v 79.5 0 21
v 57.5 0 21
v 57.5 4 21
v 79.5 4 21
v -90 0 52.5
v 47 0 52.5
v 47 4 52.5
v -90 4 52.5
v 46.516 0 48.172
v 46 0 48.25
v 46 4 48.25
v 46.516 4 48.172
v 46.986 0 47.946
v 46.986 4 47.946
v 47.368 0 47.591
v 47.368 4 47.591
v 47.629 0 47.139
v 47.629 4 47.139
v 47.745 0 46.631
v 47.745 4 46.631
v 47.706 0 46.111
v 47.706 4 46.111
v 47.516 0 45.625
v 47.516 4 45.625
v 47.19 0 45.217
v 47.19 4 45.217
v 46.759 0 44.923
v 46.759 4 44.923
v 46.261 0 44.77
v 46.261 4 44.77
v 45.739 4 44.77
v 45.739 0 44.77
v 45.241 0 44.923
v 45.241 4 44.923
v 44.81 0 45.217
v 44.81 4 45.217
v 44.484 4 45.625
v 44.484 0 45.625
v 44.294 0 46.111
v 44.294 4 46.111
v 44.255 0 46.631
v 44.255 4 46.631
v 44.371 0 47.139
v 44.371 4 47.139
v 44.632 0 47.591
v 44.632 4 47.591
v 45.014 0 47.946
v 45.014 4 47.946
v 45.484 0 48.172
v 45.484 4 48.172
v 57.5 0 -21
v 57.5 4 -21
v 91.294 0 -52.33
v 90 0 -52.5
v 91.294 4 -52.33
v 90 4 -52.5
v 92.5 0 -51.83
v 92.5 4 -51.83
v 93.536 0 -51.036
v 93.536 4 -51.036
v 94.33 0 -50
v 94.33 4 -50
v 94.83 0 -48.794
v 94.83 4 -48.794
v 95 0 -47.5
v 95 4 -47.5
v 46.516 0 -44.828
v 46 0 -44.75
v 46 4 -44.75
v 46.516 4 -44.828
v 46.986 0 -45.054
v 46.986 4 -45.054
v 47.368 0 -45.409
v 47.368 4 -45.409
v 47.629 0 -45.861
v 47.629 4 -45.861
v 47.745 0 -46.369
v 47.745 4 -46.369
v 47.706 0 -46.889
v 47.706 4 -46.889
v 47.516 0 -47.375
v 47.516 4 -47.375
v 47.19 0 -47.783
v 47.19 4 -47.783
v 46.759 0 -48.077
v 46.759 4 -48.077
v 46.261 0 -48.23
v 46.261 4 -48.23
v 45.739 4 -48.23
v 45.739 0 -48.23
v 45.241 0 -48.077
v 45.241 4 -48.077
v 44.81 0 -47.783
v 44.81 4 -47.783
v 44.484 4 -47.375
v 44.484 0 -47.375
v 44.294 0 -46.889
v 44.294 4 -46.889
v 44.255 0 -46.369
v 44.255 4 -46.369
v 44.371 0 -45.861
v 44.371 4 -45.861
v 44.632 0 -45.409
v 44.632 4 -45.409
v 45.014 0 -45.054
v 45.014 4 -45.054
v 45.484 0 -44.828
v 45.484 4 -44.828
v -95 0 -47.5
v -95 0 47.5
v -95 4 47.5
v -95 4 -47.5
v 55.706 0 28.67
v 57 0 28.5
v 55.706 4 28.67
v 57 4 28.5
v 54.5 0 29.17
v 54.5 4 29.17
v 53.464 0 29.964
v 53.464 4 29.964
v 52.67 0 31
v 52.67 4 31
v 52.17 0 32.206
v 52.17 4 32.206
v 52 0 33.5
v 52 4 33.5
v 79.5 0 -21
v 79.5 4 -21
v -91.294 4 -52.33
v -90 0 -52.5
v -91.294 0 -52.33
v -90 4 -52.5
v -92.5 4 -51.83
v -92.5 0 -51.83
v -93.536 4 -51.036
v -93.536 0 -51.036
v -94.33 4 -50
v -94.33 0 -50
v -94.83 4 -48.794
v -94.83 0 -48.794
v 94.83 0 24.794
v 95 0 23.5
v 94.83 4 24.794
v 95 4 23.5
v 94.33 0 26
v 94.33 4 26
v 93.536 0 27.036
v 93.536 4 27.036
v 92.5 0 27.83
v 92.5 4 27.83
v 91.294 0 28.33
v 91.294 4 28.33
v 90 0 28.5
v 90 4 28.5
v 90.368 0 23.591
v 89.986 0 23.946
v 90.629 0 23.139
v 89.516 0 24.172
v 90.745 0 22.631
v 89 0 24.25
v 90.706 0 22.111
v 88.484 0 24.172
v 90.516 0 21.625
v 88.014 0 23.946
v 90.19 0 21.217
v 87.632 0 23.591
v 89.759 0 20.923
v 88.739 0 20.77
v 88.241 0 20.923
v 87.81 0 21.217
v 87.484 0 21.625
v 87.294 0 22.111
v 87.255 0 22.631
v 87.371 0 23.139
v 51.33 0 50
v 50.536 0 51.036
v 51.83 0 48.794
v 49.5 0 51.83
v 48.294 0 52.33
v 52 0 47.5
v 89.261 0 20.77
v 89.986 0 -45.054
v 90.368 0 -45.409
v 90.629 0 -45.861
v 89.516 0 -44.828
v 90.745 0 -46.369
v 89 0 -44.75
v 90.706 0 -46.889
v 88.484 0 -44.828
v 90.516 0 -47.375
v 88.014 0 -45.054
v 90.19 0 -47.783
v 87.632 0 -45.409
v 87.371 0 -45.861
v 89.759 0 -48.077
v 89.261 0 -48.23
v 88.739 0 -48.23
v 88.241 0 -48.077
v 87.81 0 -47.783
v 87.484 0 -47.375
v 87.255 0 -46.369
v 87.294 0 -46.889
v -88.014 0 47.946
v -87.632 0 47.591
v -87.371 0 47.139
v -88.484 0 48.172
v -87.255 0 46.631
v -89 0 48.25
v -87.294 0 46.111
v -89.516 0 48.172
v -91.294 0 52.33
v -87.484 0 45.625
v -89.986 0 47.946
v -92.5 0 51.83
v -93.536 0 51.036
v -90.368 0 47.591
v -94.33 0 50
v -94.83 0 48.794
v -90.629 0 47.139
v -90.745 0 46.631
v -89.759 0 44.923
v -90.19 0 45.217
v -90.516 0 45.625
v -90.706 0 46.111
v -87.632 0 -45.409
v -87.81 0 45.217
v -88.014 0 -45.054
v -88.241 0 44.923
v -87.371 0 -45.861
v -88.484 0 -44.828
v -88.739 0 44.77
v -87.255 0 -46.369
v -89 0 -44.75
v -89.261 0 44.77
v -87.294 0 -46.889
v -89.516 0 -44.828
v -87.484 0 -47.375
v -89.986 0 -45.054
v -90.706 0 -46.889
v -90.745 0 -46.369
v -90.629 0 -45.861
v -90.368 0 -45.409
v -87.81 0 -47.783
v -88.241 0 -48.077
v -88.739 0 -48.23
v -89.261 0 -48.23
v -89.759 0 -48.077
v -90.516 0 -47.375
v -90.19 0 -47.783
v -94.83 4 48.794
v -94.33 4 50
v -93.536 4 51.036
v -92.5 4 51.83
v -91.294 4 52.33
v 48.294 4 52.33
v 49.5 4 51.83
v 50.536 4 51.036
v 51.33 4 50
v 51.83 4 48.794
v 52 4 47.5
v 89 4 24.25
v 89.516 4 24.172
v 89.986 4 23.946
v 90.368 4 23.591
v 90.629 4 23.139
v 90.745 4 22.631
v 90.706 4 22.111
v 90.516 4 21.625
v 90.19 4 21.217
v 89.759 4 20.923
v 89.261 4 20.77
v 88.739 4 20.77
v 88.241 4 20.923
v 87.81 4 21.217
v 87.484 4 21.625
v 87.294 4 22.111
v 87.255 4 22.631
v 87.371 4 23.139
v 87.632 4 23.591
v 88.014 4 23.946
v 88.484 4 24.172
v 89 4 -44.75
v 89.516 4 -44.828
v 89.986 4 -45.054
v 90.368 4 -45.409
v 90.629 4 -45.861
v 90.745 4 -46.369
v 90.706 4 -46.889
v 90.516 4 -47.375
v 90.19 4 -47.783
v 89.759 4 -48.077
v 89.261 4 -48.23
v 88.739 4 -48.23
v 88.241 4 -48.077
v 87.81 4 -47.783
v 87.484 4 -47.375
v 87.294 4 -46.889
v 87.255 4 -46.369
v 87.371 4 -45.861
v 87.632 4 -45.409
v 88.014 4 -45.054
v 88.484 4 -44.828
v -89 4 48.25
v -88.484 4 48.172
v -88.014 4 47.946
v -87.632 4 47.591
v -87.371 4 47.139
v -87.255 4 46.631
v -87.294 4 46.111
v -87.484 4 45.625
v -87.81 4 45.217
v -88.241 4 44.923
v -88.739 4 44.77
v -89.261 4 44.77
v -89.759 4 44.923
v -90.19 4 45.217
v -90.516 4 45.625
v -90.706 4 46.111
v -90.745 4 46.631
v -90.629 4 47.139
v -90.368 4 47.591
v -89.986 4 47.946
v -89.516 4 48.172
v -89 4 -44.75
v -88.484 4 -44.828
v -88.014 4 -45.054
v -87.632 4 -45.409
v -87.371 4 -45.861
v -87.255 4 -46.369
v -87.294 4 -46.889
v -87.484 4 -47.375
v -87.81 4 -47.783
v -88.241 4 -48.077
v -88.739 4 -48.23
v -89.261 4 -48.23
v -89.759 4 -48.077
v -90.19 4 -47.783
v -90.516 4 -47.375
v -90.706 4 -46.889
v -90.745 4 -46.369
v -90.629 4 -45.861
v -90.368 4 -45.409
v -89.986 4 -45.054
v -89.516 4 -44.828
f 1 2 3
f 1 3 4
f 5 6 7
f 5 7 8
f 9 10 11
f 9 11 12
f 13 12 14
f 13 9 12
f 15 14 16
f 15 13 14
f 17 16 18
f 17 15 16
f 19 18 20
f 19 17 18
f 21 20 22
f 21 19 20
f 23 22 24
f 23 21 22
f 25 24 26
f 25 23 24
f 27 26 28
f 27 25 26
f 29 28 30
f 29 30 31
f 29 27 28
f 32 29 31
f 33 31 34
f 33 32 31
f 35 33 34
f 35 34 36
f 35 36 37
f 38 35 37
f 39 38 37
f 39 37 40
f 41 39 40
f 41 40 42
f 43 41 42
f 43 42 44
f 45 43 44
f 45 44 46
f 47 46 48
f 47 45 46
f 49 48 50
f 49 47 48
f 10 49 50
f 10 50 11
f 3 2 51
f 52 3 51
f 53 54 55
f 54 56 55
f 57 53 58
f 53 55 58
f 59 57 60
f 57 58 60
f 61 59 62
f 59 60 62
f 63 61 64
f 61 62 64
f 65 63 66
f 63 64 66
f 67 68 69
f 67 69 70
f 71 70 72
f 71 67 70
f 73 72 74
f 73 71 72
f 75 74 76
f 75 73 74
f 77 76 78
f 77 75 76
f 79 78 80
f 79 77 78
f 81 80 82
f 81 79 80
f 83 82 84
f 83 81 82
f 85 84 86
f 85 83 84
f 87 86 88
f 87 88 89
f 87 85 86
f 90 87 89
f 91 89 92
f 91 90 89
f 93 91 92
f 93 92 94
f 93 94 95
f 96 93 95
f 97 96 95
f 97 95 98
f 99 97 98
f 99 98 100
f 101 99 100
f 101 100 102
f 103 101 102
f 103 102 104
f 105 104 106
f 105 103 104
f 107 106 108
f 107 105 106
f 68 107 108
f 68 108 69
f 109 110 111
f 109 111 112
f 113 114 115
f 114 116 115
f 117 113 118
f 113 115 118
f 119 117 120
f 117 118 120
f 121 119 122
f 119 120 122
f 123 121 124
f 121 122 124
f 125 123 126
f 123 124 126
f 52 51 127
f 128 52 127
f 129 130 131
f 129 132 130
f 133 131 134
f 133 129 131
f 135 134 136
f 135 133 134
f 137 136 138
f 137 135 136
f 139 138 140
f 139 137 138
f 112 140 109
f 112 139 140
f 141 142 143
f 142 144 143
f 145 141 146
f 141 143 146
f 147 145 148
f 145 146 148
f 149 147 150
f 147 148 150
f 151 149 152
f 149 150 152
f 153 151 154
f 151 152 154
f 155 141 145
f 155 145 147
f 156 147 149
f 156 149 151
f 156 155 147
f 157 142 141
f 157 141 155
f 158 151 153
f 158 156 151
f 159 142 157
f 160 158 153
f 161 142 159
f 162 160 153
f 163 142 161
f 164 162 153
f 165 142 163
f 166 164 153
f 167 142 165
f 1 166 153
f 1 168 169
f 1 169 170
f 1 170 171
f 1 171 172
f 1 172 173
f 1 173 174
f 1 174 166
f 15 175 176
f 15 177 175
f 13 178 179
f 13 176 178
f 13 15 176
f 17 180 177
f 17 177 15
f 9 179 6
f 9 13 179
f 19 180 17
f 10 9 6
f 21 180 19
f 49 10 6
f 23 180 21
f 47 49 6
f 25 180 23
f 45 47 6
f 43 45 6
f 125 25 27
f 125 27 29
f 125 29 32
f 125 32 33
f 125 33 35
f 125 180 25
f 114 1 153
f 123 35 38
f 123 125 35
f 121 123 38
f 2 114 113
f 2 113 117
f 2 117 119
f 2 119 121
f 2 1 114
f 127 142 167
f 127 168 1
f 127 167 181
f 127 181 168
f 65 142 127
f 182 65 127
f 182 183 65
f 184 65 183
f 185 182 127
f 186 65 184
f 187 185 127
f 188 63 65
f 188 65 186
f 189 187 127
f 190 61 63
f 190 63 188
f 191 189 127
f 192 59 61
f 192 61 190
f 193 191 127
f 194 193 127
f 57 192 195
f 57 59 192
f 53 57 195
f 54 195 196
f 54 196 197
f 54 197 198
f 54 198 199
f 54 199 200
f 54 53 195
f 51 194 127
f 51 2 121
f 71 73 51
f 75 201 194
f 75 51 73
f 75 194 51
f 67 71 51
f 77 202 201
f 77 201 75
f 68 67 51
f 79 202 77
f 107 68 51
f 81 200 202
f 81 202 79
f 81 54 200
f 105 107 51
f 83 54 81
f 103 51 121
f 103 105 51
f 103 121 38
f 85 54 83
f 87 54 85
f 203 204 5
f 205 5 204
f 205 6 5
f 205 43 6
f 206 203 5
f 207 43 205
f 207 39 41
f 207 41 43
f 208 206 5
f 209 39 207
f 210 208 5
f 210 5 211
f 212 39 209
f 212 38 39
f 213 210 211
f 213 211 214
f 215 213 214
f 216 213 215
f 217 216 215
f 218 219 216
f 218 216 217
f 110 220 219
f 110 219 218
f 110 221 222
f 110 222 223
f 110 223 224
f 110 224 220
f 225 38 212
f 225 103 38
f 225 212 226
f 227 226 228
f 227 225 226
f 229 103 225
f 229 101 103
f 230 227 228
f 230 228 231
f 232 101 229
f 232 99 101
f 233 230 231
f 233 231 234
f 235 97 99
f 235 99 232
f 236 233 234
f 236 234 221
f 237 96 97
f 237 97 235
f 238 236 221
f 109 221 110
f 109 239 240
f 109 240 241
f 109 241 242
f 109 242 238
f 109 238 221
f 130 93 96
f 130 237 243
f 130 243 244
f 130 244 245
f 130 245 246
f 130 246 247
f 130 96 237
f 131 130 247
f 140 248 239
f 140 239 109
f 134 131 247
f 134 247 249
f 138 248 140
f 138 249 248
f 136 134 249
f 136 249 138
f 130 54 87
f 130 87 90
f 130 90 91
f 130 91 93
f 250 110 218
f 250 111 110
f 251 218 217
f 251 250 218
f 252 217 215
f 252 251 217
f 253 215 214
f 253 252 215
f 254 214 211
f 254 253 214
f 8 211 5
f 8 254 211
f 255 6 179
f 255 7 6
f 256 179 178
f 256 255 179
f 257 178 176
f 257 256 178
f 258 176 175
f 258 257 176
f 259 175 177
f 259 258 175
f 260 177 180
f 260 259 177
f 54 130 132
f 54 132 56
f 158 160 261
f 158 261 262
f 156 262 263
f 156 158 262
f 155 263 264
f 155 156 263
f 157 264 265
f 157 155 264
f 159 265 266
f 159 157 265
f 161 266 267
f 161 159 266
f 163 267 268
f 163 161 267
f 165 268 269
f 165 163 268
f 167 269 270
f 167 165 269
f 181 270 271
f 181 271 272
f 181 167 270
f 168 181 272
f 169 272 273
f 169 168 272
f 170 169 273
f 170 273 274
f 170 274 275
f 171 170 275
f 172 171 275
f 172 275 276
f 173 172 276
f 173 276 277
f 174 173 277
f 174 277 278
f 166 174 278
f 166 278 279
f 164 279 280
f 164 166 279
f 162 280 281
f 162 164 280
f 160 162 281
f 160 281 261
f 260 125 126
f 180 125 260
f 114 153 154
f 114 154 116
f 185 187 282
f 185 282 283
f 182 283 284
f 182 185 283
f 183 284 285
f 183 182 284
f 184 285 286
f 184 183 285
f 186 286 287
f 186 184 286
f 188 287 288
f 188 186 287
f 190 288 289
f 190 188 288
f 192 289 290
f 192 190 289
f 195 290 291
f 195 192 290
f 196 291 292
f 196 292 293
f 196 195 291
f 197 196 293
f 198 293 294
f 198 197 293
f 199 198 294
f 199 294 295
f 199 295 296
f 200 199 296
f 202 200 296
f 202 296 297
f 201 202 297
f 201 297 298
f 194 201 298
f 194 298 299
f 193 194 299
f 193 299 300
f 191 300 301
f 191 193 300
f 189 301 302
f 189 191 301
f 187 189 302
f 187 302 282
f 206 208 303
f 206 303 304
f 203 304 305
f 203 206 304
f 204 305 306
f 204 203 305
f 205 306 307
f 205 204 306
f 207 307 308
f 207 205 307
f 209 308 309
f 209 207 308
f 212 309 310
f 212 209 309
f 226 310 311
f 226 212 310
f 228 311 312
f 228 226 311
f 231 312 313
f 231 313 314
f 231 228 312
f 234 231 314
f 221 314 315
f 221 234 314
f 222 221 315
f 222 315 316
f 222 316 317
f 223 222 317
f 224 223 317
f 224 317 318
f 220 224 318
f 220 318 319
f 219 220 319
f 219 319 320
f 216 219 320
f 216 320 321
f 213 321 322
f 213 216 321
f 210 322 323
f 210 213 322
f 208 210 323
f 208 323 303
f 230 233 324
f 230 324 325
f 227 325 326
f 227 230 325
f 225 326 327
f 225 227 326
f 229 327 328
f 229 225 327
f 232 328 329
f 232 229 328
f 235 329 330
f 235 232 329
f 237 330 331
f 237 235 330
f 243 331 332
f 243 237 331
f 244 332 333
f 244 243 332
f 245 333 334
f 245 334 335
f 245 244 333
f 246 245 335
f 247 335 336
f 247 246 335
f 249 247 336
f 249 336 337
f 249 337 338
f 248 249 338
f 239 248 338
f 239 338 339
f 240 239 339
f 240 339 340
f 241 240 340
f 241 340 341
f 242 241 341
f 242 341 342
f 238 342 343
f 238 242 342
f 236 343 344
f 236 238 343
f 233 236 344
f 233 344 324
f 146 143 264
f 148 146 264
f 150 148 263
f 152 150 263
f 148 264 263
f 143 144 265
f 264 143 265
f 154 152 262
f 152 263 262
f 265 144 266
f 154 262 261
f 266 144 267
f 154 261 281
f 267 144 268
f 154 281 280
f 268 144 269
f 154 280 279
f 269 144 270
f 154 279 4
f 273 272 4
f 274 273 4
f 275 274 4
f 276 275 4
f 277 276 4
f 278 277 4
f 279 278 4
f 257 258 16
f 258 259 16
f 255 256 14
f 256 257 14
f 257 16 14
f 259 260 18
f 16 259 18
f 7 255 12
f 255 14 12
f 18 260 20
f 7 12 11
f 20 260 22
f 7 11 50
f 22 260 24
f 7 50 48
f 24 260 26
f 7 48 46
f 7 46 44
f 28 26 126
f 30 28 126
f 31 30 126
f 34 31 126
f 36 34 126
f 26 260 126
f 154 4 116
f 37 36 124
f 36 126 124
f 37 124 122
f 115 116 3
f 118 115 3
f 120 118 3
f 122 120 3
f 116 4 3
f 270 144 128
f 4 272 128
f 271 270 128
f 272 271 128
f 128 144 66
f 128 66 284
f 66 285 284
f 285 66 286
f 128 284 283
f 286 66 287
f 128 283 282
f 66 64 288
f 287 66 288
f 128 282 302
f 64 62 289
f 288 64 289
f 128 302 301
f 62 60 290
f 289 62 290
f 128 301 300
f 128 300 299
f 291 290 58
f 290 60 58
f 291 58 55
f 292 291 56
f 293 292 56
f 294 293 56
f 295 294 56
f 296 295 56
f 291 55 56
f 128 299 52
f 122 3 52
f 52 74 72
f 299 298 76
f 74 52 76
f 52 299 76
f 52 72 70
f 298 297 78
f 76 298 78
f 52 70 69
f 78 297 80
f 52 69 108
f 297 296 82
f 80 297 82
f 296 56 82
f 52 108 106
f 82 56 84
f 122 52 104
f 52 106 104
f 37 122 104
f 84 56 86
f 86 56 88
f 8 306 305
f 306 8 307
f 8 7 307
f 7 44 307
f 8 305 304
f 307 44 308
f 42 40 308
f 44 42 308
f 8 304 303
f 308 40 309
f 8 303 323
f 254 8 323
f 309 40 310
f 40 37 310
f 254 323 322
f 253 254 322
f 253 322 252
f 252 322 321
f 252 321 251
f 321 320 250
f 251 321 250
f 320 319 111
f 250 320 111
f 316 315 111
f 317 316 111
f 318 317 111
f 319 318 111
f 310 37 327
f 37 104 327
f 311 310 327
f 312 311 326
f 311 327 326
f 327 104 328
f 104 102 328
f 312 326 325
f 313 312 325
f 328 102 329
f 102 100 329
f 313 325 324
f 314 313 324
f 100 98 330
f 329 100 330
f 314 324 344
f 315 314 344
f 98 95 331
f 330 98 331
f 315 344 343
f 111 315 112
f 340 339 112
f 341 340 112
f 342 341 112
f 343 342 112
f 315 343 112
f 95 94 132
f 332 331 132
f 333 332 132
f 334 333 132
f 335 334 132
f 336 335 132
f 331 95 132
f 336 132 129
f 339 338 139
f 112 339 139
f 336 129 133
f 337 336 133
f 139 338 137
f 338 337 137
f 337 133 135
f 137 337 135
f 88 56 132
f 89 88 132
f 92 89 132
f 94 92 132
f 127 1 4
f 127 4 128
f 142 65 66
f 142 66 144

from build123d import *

# Parameters (mm, degrees)
SKETCH_1_R      = 1.75
SKETCH_1_W      = 22
SKETCH_1_H      = 42
EXTRUDE_1_DEPTH = 4
FILLET_1_R      = 5


with BuildPart() as part:
    # 草图1 → 凸台-拉伸1 (new body)
    with BuildSketch(Plane(origin=(0, 0, 0), x_dir=(1, 0, 0), z_dir=(0, 1, 0))):
        Polygon((-95, 52.5), (95, 52.5), (95, -28.5), (52, -28.5), (52, -52.5), (-95, -52.5), align=None)
        with Locations(Location((-89, -46.5, 0), (0, 0, 270))):
            Circle(SKETCH_1_R, mode=Mode.SUBTRACT)
        with Locations(Location((46, -46.5, 0), (0, 0, 270))):
            Circle(SKETCH_1_R, mode=Mode.SUBTRACT)
        with Locations(Location((46, 46.5, 0), (0, 0, 270))):
            Circle(SKETCH_1_R, mode=Mode.SUBTRACT)
        with Locations(Location((-89, 46.5, 0), (0, 0, 270))):
            Circle(SKETCH_1_R, mode=Mode.SUBTRACT)
        with Locations(Location((89, 46.5, 0), (0, 0, 270))):
            Circle(SKETCH_1_R, mode=Mode.SUBTRACT)
        with Locations(Location((89, -22.5, 0), (0, 0, 270))):
            Circle(SKETCH_1_R, mode=Mode.SUBTRACT)
        with Locations((68.5, 0)):
            Rectangle(SKETCH_1_W, SKETCH_1_H, mode=Mode.SUBTRACT)
    extrude(amount=EXTRUDE_1_DEPTH)

    # 圆角1
    fillet_1_edges = [part.edges().sort_by_distance(p)[0] for p in [
        (-95, 2, -52.5),
        (95, 2, -52.5),
        (95, 2, 28.5),
        (52, 2, 28.5),
        (52, 2, 52.5),
        (-95, 2, 52.5),
    ]]
    fillet(fillet_1_edges, radius=FILLET_1_R)


solid = part.part
